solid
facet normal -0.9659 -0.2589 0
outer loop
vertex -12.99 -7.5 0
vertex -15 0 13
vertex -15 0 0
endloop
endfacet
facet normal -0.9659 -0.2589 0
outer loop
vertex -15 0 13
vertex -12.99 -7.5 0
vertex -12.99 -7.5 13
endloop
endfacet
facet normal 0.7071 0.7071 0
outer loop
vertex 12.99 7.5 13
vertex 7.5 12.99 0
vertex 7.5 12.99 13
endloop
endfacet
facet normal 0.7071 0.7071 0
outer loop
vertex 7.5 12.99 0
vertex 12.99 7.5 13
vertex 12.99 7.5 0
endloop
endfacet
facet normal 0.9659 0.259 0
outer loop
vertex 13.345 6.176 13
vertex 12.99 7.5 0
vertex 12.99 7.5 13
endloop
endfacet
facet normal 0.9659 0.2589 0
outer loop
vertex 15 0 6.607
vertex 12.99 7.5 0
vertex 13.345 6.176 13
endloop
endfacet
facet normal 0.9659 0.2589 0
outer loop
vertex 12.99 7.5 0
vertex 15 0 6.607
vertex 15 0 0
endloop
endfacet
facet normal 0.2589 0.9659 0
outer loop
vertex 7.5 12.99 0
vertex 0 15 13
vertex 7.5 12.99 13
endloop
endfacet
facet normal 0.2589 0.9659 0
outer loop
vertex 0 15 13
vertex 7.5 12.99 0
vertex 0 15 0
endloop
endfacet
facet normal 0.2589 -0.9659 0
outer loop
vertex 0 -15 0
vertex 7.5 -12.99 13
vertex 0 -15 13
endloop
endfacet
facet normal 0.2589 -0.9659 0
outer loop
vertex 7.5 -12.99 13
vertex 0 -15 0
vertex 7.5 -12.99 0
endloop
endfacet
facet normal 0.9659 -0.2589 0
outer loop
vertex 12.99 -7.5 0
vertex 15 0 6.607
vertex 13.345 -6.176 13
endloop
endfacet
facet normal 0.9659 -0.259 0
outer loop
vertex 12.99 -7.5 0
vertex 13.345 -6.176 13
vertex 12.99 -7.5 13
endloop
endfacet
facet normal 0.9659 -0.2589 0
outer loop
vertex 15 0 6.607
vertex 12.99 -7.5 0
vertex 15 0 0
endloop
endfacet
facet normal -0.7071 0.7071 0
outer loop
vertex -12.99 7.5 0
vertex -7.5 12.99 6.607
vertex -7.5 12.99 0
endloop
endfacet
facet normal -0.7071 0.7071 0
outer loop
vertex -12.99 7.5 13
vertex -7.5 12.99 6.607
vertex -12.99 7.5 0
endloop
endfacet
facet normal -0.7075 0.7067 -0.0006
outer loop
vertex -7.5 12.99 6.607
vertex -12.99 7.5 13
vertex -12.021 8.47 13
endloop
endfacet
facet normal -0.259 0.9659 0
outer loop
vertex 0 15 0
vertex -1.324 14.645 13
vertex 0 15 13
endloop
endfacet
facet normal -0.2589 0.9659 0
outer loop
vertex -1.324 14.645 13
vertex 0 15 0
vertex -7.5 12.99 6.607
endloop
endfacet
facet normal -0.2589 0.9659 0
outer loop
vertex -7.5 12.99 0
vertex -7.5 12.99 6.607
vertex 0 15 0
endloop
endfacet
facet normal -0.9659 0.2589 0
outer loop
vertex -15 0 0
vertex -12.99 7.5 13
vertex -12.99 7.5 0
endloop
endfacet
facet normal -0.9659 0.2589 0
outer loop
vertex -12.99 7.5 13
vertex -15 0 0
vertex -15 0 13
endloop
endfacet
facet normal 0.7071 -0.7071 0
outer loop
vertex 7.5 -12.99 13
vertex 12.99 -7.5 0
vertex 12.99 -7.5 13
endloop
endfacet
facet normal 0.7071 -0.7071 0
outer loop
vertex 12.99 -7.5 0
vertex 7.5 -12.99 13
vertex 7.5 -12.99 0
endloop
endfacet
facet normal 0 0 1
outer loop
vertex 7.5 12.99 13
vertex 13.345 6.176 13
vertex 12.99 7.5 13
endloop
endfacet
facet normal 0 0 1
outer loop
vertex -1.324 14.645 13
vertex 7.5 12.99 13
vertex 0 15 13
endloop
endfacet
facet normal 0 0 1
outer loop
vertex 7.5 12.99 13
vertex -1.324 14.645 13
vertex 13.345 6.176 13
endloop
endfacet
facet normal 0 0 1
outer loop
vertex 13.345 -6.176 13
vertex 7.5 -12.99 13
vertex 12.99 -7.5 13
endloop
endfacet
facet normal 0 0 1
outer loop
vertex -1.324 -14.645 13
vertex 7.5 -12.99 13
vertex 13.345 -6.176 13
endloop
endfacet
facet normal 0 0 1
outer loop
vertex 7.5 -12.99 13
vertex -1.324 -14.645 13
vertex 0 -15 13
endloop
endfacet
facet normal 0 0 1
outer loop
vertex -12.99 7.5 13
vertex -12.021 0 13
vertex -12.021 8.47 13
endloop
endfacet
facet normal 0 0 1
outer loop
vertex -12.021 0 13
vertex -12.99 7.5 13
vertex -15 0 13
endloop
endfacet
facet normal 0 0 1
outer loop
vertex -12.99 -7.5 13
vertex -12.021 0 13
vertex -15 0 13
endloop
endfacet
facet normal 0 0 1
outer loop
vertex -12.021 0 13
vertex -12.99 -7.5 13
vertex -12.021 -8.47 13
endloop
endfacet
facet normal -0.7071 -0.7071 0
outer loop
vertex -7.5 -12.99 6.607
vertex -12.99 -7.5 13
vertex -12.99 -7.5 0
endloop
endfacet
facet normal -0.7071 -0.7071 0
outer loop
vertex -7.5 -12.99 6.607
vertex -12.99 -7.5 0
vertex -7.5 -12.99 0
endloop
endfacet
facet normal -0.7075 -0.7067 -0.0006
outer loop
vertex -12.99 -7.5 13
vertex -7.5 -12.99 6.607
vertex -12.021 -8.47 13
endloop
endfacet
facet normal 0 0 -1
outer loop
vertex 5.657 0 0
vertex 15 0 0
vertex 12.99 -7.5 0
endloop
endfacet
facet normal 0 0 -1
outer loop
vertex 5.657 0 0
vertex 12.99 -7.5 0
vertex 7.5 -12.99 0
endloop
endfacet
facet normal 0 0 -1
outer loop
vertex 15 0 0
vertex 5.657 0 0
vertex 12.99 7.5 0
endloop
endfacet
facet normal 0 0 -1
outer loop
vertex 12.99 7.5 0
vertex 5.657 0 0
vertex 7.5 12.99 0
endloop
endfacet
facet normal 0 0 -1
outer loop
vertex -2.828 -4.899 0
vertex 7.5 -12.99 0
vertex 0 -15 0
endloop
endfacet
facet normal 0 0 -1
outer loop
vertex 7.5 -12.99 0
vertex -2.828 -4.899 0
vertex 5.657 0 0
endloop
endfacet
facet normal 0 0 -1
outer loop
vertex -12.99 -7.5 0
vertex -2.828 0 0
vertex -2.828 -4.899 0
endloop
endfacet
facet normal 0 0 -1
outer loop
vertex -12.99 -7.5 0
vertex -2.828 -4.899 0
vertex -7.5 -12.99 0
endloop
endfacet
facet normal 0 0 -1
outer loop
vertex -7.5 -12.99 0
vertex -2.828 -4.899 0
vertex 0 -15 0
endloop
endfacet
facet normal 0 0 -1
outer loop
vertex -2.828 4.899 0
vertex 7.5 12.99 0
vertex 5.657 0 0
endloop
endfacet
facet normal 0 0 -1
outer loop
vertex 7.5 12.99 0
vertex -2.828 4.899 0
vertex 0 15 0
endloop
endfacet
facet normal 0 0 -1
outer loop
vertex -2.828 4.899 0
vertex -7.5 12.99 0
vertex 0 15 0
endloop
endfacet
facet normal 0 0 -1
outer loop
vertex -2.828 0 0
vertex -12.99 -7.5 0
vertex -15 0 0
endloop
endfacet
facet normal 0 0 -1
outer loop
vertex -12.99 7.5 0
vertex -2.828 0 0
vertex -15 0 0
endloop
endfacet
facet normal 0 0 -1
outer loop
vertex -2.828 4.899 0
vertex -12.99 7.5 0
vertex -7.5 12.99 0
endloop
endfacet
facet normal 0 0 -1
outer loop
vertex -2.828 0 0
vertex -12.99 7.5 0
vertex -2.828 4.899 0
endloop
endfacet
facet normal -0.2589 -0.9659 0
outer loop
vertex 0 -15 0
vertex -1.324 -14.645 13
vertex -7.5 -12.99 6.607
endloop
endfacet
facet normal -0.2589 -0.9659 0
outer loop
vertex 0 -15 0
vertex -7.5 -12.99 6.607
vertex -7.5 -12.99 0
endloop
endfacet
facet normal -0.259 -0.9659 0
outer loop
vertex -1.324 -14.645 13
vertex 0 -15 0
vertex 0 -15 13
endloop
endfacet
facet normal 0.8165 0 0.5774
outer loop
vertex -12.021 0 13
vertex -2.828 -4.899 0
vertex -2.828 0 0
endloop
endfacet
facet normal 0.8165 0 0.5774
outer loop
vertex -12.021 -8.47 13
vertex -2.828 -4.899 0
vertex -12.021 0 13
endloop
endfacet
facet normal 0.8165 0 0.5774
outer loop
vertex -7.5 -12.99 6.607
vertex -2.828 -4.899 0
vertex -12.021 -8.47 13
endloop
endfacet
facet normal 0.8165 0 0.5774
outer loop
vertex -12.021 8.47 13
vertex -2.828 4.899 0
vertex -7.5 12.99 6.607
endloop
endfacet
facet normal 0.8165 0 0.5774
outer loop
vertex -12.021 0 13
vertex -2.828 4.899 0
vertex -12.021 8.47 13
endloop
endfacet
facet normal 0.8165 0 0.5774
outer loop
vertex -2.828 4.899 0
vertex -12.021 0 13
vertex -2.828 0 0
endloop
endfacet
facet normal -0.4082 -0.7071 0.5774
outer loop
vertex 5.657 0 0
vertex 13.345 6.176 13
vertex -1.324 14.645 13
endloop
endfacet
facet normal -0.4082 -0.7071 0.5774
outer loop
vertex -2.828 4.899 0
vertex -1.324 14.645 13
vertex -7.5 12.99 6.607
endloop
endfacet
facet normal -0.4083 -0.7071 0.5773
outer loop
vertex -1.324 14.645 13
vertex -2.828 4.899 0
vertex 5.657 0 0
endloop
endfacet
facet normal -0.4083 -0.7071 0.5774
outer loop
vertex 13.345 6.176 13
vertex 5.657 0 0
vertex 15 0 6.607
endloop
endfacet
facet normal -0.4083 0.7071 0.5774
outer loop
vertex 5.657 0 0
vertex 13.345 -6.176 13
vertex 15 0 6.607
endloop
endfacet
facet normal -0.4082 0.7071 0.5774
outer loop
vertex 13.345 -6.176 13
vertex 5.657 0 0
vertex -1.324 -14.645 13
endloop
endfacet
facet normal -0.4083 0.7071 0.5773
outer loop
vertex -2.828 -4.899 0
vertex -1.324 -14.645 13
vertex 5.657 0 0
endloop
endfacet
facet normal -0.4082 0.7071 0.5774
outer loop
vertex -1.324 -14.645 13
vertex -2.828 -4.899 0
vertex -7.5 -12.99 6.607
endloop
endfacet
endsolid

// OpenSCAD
//Corner cutting jig

difference() {
	cylinder(d=30, h=13, $fn=12);
	translate([0,0,-4]) rotate([45,-atan(1/sqrt(2)),0]) cube(50);
}
